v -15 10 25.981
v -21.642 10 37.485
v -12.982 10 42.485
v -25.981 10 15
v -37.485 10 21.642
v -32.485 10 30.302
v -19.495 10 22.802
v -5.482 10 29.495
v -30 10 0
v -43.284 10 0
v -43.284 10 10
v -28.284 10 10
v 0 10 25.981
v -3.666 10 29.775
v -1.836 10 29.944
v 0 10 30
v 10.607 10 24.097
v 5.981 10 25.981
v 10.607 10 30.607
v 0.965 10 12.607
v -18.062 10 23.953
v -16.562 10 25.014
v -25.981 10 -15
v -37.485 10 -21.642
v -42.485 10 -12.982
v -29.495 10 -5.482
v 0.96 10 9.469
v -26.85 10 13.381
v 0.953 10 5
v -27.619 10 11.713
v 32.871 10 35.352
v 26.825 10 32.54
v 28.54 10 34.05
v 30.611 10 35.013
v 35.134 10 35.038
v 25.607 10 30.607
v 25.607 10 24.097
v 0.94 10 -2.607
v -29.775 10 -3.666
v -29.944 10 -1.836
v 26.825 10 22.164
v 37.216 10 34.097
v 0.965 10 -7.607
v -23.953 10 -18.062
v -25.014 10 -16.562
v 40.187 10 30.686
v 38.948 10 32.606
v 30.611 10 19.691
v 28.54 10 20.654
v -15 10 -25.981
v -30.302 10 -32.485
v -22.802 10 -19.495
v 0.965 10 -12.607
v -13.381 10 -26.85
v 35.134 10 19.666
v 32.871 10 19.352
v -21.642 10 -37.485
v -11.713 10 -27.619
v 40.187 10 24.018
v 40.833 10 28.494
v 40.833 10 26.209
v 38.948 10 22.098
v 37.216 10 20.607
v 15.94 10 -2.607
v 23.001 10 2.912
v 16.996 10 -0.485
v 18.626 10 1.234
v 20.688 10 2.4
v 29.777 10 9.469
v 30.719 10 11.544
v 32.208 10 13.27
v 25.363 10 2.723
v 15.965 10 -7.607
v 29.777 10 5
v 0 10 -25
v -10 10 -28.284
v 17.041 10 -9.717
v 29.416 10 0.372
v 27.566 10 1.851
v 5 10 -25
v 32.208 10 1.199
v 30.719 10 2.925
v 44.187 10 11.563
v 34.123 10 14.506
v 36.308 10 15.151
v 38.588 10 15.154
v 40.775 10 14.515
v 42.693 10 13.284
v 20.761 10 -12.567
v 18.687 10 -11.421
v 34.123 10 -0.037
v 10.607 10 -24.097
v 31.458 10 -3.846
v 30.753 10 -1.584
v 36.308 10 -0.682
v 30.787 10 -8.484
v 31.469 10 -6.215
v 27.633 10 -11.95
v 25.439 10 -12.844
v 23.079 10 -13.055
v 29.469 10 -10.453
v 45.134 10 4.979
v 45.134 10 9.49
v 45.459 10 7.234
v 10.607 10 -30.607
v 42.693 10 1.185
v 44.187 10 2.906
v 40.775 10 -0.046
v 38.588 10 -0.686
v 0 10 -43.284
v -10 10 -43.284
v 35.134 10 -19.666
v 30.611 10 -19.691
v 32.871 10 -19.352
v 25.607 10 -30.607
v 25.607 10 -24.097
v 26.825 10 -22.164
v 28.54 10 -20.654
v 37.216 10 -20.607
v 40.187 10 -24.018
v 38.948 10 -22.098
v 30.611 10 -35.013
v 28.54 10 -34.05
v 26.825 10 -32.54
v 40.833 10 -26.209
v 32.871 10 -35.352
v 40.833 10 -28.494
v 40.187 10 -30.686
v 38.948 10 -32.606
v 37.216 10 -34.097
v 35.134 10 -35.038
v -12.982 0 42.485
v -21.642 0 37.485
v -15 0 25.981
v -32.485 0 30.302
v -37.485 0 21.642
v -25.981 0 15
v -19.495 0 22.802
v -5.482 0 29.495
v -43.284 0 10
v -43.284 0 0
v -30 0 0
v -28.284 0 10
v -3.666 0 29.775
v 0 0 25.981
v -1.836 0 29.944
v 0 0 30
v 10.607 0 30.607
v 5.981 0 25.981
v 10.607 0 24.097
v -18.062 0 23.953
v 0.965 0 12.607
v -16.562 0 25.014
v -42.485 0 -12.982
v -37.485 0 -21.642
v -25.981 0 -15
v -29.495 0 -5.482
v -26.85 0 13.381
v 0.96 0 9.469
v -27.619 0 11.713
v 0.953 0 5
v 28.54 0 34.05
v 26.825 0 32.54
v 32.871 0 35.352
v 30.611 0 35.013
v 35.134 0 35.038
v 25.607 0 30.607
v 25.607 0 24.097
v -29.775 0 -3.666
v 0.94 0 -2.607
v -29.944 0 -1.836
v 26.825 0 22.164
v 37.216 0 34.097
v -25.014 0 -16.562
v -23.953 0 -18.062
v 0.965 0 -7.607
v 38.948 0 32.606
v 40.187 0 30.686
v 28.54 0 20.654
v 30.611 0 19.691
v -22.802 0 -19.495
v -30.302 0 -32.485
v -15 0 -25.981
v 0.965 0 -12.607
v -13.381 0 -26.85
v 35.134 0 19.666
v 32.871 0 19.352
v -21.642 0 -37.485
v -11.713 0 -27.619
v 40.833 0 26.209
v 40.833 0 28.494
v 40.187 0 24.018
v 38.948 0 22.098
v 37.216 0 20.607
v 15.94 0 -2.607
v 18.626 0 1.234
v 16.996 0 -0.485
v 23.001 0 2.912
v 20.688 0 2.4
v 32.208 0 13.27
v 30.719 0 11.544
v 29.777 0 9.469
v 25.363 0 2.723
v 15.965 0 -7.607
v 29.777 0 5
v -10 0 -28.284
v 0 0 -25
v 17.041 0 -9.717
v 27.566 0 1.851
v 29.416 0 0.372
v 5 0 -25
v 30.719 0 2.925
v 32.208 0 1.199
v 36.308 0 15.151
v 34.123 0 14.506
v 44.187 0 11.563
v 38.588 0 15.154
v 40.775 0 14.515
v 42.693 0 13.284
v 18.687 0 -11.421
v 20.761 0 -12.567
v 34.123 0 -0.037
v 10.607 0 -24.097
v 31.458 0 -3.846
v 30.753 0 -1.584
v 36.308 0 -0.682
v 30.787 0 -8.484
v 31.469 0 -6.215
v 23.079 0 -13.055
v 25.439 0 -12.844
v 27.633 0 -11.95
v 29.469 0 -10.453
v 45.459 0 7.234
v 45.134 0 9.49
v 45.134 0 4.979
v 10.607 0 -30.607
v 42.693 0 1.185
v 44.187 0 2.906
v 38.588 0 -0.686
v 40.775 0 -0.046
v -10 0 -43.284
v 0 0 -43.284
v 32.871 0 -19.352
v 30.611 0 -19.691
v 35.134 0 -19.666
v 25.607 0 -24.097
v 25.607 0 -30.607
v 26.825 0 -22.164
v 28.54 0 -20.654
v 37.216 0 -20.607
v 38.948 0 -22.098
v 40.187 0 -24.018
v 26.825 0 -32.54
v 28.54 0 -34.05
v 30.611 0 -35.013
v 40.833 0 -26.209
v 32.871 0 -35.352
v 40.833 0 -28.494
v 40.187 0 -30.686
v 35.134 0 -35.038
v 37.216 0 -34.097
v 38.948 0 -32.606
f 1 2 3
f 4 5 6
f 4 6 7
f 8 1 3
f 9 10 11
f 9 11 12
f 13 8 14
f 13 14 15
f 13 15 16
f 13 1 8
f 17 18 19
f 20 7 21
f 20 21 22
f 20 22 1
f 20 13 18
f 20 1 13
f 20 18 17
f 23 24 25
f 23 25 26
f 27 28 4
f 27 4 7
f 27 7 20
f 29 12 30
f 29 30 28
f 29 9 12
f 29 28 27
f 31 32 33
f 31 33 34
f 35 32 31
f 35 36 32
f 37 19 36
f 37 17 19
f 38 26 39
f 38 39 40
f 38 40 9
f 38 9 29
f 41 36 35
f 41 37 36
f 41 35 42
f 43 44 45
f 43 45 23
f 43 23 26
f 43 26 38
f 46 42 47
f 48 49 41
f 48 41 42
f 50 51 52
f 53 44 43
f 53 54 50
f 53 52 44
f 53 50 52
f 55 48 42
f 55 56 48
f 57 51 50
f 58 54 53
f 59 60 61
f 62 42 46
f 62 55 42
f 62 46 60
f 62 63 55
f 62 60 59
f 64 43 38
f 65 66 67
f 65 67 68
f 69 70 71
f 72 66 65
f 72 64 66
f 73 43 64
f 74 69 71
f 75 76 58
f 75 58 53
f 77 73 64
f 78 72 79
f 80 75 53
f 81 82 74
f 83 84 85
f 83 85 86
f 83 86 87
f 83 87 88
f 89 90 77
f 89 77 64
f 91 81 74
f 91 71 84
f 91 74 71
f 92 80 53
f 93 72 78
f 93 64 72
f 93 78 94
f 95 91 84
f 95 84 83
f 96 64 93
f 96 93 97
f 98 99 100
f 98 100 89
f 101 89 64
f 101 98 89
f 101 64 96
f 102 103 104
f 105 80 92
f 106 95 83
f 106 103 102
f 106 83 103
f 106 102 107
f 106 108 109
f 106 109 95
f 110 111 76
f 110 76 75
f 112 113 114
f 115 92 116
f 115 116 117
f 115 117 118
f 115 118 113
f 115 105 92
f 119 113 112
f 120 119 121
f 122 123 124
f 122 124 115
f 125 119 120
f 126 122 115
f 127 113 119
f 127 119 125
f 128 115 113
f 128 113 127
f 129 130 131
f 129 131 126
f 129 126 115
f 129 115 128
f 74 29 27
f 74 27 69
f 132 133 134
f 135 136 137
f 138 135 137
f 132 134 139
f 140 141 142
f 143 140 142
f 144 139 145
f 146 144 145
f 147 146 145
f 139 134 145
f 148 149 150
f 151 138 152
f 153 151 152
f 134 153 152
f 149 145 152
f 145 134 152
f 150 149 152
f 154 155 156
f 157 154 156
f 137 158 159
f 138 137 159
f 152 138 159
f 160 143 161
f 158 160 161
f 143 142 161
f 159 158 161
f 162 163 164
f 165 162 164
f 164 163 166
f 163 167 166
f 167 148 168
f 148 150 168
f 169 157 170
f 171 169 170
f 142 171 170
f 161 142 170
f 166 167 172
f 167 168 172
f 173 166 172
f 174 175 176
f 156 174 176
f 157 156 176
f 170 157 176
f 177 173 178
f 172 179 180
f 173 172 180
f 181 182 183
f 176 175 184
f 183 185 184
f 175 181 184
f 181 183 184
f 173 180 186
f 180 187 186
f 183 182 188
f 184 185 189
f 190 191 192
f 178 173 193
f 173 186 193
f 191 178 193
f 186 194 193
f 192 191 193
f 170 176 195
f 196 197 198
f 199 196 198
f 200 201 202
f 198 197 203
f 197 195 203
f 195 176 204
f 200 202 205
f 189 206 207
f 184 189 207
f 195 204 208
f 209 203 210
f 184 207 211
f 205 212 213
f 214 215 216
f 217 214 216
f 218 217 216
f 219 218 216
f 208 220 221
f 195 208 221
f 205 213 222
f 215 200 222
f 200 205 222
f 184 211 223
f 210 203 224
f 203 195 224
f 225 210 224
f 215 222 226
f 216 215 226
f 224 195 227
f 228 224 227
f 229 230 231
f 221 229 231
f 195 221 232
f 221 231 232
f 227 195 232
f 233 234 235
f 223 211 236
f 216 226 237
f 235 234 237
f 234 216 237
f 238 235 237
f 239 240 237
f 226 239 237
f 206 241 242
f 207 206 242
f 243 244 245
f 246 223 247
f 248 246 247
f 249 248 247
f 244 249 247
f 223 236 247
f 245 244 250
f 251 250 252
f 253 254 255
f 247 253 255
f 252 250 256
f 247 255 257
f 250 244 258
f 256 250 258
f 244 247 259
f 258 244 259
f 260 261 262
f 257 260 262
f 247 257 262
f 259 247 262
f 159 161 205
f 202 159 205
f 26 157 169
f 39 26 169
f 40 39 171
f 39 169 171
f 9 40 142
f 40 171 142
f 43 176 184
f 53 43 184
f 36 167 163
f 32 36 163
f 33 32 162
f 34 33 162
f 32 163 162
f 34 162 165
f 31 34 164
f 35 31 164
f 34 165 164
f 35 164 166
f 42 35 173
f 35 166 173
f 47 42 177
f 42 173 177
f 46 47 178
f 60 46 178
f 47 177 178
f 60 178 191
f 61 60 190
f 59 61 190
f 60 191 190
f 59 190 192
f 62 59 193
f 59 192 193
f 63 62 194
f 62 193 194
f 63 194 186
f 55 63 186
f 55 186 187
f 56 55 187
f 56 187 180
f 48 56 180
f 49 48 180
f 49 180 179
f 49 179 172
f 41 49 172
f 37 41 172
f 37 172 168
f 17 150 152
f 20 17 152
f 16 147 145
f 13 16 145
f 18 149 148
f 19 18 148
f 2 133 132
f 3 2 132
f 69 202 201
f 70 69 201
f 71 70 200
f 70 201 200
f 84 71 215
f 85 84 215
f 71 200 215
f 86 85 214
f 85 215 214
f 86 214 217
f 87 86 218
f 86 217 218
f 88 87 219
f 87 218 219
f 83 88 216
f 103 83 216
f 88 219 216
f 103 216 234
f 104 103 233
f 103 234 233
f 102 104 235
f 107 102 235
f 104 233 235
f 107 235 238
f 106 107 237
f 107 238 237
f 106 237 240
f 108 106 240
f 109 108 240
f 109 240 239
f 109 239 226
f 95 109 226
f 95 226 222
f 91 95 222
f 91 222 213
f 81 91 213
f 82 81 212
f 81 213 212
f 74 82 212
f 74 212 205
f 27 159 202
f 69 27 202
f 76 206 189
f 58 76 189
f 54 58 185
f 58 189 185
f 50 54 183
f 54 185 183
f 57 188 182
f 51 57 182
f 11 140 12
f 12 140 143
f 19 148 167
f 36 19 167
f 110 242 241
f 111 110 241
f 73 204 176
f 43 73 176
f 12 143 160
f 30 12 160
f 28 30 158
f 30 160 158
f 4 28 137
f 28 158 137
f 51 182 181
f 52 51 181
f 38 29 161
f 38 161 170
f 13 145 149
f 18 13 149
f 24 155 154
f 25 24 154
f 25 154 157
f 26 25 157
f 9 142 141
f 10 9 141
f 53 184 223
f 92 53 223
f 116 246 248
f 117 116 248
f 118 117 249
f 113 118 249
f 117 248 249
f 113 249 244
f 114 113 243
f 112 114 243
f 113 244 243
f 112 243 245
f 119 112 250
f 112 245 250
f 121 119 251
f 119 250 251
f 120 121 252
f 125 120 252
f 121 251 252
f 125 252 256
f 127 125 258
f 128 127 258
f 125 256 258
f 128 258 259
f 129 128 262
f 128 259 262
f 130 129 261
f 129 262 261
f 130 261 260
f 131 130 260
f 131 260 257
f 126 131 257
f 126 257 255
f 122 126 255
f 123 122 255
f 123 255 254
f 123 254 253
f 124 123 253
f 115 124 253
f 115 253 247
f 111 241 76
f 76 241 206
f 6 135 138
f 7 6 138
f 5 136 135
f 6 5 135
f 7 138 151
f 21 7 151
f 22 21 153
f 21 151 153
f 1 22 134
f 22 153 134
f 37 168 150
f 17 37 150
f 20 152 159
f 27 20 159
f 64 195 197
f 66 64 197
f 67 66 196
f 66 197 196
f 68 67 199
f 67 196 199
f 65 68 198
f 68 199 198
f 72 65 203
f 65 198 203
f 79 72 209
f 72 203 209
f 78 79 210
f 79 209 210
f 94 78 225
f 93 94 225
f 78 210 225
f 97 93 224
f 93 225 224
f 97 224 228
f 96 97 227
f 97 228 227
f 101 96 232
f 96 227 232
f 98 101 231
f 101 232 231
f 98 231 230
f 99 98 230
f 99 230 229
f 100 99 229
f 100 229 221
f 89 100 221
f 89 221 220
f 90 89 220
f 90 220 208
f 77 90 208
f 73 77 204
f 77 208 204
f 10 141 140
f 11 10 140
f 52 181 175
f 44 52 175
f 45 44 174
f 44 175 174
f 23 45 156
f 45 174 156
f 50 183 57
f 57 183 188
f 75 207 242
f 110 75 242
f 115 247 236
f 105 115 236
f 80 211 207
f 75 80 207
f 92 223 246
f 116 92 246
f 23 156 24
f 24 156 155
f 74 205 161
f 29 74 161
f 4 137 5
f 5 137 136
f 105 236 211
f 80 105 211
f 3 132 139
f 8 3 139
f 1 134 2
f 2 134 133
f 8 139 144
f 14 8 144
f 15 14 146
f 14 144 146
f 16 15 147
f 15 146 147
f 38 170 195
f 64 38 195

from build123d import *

# Parameters (mm, degrees)
BOSS_EXTRUDE1_DEPTH = 10


with BuildPart() as part:
    # Sketch1 → Boss-Extrude1 (new body)
    with BuildSketch(Plane(origin=(0, 0, 0), x_dir=(1, 0, 0), z_dir=(0, 1, 0))):
        with BuildLine():
            Line((-10, 43.284271247), (-10, 28.284271247))
            ThreePointArc((-10, 28.284271247), (-12.552949398, 27.247448714), (-15, 25.980762114))
            Line((-15, 25.980762114), (-21.642135624, 37.485278485))
            Line((-21.642135624, 37.485278485), (-30.302389662, 32.485278485))
            Line((-30.302389662, 32.485278485), (-22.802389662, 19.494897428))
            ThreePointArc((-22.802389662, 19.494897428), (-24.494897428, 17.320508076), (-25.980762114, 15))
            Line((-25.980762114, 15), (-37.485278485, 21.642135624))
            Line((-37.485278485, 21.642135624), (-42.485278485, 12.981881586))
            Line((-42.485278485, 12.981881586), (-29.494897428, 5.481881586))
            ThreePointArc((-29.494897428, 5.481881586), (-29.873457473, 2.752551286), (-30, 0))
            Line((-30, 0), (-43.284271247, 0))
            Line((-43.284271247, 0), (-43.284271247, -10))
            Line((-43.284271247, -10), (-28.284271247, -10))
            ThreePointArc((-28.284271247, -10), (-27.247448714, -12.552949398), (-25.980762114, -15))
            Line((-25.980762114, -15), (-37.485278485, -21.642135624))
            Line((-37.485278485, -21.642135624), (-32.485278485, -30.302389662))
            Line((-32.485278485, -30.302389662), (-19.494897428, -22.802389662))
            ThreePointArc((-19.494897428, -22.802389662), (-17.320508076, -24.494897428), (-15, -25.980762114))
            Line((-15, -25.980762114), (-21.642135624, -37.485278485))
            Line((-21.642135624, -37.485278485), (-12.981881586, -42.485278485))
            Line((-12.981881586, -42.485278485), (-5.481881586, -29.494897428))
            ThreePointArc((-5.481881586, -29.494897428), (-2.752551286, -29.873457473), (0, -30))
            Line((0, -30), (0, -25.980762114))
            Line((0, -25.980762114), (5.980762114, -25.980762114))
            Line((5.980762114, -25.980762114), (10.606601718, -30.606601718))
            Line((10.606601718, -30.606601718), (25.606601718, -30.606601718))
            ThreePointArc((25.606601718, -30.606601718), (40.914600616, -27.351889426), (25.606601718, -24.097177134))
            Line((25.606601718, -24.097177134), (10.606601718, -24.097177134))
            Line((10.606601718, -24.097177134), (0.964787573, -12.606510487))
            Line((0.964787573, -12.606510487), (0.959757824, -9.468981171))
            Line((0.959757824, -9.468981171), (29.777364974, -9.468981171))
            ThreePointArc((29.777364974, -9.468981171), (45.458969743, -7.234490585), (29.777364974, -5))
            Line((29.777364974, -5), (0.952593634, -5))
            Line((0.952593634, -5), (0.940399696, 2.606510487))
            Line((0.940399696, 2.606510487), (15.940399696, 2.606510487))
            ThreePointArc((15.940399696, 2.606510487), (31.551740371, 5.030424476), (15.964787573, 7.606510487))
            Line((15.964787573, 7.606510487), (0.964787573, 7.606510487))
            Line((0.964787573, 7.606510487), (0.964787573, 12.606510487))
            Line((0.964787573, 12.606510487), (10.606601718, 24.097177134))
            Line((10.606601718, 24.097177134), (25.606601718, 24.097177134))
            ThreePointArc((25.606601718, 24.097177134), (40.914600616, 27.351889426), (25.606601718, 30.606601718))
            Line((25.606601718, 30.606601718), (10.606601718, 30.606601718))
            Line((10.606601718, 30.606601718), (5, 25))
            Line((5, 25), (0, 25))
            Line((0, 25), (0, 30))
            Line((0, 30), (0, 43.284271247))
            Line((0, 43.284271247), (-10, 43.284271247))
        make_face()
    extrude(amount=BOSS_EXTRUDE1_DEPTH)


solid = part.part
